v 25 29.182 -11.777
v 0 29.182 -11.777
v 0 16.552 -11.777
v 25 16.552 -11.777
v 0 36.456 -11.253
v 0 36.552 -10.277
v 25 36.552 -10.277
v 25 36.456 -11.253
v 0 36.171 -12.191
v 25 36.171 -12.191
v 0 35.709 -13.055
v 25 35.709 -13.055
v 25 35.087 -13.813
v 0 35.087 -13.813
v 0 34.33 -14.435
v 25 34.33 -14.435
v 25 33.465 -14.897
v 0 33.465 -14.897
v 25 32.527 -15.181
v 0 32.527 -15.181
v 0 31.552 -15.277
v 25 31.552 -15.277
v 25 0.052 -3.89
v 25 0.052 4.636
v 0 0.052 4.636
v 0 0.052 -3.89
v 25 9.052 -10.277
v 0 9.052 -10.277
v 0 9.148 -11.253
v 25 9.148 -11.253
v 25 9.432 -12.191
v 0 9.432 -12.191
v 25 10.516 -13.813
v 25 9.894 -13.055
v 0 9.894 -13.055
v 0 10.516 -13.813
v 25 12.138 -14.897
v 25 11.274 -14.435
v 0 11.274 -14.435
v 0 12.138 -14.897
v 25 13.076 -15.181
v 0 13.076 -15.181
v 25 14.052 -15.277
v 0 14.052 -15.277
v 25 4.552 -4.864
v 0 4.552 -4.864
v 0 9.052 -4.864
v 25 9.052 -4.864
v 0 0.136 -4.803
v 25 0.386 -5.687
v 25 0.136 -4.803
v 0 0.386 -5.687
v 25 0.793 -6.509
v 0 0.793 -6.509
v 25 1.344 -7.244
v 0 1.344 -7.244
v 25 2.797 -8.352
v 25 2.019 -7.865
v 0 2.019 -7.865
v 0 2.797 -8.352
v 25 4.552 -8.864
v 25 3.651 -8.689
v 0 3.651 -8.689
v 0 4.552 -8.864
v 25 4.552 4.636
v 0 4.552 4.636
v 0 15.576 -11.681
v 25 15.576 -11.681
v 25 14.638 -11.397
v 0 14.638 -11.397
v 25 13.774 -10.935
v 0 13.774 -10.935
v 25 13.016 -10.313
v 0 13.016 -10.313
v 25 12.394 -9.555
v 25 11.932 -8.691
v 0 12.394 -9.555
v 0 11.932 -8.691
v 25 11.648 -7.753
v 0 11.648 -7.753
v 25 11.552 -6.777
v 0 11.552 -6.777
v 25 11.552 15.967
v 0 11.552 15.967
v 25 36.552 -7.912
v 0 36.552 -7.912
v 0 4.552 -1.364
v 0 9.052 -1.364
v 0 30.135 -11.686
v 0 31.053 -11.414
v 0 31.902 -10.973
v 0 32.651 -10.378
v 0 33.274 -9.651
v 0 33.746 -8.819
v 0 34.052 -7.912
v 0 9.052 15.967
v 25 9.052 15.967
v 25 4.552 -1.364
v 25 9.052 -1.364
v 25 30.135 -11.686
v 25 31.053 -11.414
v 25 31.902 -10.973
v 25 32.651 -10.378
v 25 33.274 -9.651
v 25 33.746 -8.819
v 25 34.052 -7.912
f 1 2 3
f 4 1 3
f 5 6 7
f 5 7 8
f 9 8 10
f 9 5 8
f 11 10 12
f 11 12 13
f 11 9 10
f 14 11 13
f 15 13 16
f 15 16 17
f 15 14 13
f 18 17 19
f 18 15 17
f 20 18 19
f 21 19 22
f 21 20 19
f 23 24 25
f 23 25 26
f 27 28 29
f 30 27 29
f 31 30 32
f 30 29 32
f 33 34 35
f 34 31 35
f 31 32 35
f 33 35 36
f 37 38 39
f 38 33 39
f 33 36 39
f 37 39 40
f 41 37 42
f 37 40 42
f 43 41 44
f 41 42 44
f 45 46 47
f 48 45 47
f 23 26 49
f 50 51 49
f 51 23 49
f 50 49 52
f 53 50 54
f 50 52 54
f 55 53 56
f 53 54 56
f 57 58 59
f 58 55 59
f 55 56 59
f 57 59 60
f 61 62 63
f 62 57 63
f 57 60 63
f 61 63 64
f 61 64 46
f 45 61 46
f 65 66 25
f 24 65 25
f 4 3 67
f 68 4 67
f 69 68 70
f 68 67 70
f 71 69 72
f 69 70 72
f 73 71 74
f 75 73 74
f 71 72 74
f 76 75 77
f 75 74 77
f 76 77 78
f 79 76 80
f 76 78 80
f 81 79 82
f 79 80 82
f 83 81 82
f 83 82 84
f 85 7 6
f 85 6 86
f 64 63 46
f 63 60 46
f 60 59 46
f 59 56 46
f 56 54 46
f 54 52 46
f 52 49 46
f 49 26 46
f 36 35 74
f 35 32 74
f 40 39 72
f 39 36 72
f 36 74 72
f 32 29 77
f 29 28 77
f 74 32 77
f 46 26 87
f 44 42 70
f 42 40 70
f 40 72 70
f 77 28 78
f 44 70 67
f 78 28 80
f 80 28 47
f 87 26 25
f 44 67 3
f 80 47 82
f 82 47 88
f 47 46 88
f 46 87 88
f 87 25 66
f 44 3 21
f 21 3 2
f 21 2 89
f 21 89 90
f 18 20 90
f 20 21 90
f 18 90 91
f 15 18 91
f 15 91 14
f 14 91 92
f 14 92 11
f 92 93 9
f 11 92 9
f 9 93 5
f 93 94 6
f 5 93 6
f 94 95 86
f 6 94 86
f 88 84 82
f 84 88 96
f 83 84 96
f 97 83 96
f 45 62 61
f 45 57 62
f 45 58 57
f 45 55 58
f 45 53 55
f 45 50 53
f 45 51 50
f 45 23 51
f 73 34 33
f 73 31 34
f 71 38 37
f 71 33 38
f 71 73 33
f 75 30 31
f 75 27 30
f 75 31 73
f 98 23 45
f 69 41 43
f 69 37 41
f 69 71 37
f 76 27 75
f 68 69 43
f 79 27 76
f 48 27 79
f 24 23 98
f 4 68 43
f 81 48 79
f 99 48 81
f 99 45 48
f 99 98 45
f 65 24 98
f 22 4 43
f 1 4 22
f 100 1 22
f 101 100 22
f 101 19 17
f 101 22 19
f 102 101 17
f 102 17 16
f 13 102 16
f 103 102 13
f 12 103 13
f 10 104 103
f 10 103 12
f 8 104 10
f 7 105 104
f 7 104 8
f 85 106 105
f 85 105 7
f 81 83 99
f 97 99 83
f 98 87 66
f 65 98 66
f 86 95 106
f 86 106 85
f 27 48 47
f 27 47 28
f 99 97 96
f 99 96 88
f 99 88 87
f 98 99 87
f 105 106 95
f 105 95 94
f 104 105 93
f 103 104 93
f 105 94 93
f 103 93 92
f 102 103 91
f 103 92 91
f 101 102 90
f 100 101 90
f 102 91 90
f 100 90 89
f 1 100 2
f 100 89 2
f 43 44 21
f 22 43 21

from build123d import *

# Parameters (mm, degrees)
F0_W        = 2.5
F0_H        = 3.8657399043
F1_DEPTH    = 25
F2_T1_DEPTH = 25
F2_T3_DEPTH = 25
F2_T5_DEPTH = 50
F2_T7_DEPTH = 50
F3_T1_DEPTH = 49.8746859277


# Not quite as in the source:
# - a fillet or chamfer that OpenCascade refuses, or shapes differently, is made with other operations: its cross-section is extruded or revolved along the edge and cut away or added


with BuildPart() as f1:
    # F0 (on Right) → F1 (new body)
    with BuildSketch(Plane.YZ):
        Polygon((4.5518016368, 4.6355622155), (0.0518016368, 4.6355622155), (0.0518016368, -8.8644377845), (4.5518016368, -8.8644377845), (4.5518016368, -4.8644377845), (9.0518016368, -4.8644377845), (9.0518016368, -15.2773326263), (11.5518016368, -15.2773326263), (11.5518016368, -11.7773326263), (11.5518016368, 15.966644237), (9.0518016368, 15.966644237), (9.0518016368, -1.3644377845), (4.5518016368, -1.3644377845), align=None)
        Polygon((11.5518016368, -11.7773326263), (11.5518016368, -15.2773326263), (36.5518016368, -15.2773326263), (36.5518016368, -11.7773326263), (34.0518016368, -11.7773326263), align=None)
        with Locations((35.3018016368, -9.8444626741)):
            Rectangle(F0_W, F0_H)
    extrude(amount=F1_DEPTH)

    # F2: fillet of radius 5 on 4 edges, made by hand

    # F2_s2 → F2_t1 (join)
    with BuildSketch(Plane.YZ):
        with BuildLine():
            ThreePointArc((34.0518016368, -7.9115927219), (32.2909091759, -10.6934084988), (29.1821554448, -11.7773326263))
            Line((29.1821554448, -11.7773326263), (34.0518016368, -11.7773326263))
            Line((34.0518016368, -11.7773326263), (34.0518016368, -7.9115927219))
        make_face()
    extrude(amount=F2_T1_DEPTH)

    # F2_s4 → F2_t3 (join)
    with BuildSketch(Plane.YZ):
        with BuildLine():
            ThreePointArc((16.5518016368, -11.7773326263), (13.0162677309, -10.3128665322), (11.5518016368, -6.7773326263))
            Line((11.5518016368, -6.7773326263), (11.5518016368, -11.7773326263))
            Line((11.5518016368, -11.7773326263), (16.5518016368, -11.7773326263))
        make_face()
    extrude(amount=F2_T3_DEPTH)

    # F2_s6 → F2_t5 (cut)
    with BuildSketch(Plane.YZ.offset(-12.5)):
        with BuildLine():
            ThreePointArc((9.0518016368, -10.2773326263), (10.5162677309, -13.8128665322), (14.0518016368, -15.2773326263))
            Line((14.0518016368, -15.2773326263), (9.0518016368, -15.2773326263))
            Line((9.0518016368, -15.2773326263), (9.0518016368, -10.2773326263))
        make_face()
    extrude(amount=F2_T5_DEPTH, mode=Mode.SUBTRACT)

    # F2_s8 → F2_t7 (cut)
    with BuildSketch(Plane.YZ.offset(-12.5)):
        with BuildLine():
            ThreePointArc((36.5518016368, -10.2773326263), (35.0873355427, -13.8128665322), (31.5518016368, -15.2773326263))
            Line((31.5518016368, -15.2773326263), (36.5518016368, -15.2773326263))
            Line((36.5518016368, -15.2773326263), (36.5518016368, -10.2773326263))
        make_face()
    extrude(amount=F2_T7_DEPTH, mode=Mode.SUBTRACT)

    # F3: fillet of radius 5 on 1 edges, made by hand

    # F3_s2 → F3_t1 (cut)
    with BuildSketch(Plane.YZ.offset(-12.4373429638)):
        with BuildLine():
            ThreePointArc((0.0518016368, -3.889500599), (1.3437023933, -7.2436025653), (4.5518016368, -8.8644377845))
            Line((4.5518016368, -8.8644377845), (0.0518016368, -8.8644377845))
            Line((0.0518016368, -8.8644377845), (0.0518016368, -3.889500599))
        make_face()
    extrude(amount=F3_T1_DEPTH, mode=Mode.SUBTRACT)


solid = f1.part
